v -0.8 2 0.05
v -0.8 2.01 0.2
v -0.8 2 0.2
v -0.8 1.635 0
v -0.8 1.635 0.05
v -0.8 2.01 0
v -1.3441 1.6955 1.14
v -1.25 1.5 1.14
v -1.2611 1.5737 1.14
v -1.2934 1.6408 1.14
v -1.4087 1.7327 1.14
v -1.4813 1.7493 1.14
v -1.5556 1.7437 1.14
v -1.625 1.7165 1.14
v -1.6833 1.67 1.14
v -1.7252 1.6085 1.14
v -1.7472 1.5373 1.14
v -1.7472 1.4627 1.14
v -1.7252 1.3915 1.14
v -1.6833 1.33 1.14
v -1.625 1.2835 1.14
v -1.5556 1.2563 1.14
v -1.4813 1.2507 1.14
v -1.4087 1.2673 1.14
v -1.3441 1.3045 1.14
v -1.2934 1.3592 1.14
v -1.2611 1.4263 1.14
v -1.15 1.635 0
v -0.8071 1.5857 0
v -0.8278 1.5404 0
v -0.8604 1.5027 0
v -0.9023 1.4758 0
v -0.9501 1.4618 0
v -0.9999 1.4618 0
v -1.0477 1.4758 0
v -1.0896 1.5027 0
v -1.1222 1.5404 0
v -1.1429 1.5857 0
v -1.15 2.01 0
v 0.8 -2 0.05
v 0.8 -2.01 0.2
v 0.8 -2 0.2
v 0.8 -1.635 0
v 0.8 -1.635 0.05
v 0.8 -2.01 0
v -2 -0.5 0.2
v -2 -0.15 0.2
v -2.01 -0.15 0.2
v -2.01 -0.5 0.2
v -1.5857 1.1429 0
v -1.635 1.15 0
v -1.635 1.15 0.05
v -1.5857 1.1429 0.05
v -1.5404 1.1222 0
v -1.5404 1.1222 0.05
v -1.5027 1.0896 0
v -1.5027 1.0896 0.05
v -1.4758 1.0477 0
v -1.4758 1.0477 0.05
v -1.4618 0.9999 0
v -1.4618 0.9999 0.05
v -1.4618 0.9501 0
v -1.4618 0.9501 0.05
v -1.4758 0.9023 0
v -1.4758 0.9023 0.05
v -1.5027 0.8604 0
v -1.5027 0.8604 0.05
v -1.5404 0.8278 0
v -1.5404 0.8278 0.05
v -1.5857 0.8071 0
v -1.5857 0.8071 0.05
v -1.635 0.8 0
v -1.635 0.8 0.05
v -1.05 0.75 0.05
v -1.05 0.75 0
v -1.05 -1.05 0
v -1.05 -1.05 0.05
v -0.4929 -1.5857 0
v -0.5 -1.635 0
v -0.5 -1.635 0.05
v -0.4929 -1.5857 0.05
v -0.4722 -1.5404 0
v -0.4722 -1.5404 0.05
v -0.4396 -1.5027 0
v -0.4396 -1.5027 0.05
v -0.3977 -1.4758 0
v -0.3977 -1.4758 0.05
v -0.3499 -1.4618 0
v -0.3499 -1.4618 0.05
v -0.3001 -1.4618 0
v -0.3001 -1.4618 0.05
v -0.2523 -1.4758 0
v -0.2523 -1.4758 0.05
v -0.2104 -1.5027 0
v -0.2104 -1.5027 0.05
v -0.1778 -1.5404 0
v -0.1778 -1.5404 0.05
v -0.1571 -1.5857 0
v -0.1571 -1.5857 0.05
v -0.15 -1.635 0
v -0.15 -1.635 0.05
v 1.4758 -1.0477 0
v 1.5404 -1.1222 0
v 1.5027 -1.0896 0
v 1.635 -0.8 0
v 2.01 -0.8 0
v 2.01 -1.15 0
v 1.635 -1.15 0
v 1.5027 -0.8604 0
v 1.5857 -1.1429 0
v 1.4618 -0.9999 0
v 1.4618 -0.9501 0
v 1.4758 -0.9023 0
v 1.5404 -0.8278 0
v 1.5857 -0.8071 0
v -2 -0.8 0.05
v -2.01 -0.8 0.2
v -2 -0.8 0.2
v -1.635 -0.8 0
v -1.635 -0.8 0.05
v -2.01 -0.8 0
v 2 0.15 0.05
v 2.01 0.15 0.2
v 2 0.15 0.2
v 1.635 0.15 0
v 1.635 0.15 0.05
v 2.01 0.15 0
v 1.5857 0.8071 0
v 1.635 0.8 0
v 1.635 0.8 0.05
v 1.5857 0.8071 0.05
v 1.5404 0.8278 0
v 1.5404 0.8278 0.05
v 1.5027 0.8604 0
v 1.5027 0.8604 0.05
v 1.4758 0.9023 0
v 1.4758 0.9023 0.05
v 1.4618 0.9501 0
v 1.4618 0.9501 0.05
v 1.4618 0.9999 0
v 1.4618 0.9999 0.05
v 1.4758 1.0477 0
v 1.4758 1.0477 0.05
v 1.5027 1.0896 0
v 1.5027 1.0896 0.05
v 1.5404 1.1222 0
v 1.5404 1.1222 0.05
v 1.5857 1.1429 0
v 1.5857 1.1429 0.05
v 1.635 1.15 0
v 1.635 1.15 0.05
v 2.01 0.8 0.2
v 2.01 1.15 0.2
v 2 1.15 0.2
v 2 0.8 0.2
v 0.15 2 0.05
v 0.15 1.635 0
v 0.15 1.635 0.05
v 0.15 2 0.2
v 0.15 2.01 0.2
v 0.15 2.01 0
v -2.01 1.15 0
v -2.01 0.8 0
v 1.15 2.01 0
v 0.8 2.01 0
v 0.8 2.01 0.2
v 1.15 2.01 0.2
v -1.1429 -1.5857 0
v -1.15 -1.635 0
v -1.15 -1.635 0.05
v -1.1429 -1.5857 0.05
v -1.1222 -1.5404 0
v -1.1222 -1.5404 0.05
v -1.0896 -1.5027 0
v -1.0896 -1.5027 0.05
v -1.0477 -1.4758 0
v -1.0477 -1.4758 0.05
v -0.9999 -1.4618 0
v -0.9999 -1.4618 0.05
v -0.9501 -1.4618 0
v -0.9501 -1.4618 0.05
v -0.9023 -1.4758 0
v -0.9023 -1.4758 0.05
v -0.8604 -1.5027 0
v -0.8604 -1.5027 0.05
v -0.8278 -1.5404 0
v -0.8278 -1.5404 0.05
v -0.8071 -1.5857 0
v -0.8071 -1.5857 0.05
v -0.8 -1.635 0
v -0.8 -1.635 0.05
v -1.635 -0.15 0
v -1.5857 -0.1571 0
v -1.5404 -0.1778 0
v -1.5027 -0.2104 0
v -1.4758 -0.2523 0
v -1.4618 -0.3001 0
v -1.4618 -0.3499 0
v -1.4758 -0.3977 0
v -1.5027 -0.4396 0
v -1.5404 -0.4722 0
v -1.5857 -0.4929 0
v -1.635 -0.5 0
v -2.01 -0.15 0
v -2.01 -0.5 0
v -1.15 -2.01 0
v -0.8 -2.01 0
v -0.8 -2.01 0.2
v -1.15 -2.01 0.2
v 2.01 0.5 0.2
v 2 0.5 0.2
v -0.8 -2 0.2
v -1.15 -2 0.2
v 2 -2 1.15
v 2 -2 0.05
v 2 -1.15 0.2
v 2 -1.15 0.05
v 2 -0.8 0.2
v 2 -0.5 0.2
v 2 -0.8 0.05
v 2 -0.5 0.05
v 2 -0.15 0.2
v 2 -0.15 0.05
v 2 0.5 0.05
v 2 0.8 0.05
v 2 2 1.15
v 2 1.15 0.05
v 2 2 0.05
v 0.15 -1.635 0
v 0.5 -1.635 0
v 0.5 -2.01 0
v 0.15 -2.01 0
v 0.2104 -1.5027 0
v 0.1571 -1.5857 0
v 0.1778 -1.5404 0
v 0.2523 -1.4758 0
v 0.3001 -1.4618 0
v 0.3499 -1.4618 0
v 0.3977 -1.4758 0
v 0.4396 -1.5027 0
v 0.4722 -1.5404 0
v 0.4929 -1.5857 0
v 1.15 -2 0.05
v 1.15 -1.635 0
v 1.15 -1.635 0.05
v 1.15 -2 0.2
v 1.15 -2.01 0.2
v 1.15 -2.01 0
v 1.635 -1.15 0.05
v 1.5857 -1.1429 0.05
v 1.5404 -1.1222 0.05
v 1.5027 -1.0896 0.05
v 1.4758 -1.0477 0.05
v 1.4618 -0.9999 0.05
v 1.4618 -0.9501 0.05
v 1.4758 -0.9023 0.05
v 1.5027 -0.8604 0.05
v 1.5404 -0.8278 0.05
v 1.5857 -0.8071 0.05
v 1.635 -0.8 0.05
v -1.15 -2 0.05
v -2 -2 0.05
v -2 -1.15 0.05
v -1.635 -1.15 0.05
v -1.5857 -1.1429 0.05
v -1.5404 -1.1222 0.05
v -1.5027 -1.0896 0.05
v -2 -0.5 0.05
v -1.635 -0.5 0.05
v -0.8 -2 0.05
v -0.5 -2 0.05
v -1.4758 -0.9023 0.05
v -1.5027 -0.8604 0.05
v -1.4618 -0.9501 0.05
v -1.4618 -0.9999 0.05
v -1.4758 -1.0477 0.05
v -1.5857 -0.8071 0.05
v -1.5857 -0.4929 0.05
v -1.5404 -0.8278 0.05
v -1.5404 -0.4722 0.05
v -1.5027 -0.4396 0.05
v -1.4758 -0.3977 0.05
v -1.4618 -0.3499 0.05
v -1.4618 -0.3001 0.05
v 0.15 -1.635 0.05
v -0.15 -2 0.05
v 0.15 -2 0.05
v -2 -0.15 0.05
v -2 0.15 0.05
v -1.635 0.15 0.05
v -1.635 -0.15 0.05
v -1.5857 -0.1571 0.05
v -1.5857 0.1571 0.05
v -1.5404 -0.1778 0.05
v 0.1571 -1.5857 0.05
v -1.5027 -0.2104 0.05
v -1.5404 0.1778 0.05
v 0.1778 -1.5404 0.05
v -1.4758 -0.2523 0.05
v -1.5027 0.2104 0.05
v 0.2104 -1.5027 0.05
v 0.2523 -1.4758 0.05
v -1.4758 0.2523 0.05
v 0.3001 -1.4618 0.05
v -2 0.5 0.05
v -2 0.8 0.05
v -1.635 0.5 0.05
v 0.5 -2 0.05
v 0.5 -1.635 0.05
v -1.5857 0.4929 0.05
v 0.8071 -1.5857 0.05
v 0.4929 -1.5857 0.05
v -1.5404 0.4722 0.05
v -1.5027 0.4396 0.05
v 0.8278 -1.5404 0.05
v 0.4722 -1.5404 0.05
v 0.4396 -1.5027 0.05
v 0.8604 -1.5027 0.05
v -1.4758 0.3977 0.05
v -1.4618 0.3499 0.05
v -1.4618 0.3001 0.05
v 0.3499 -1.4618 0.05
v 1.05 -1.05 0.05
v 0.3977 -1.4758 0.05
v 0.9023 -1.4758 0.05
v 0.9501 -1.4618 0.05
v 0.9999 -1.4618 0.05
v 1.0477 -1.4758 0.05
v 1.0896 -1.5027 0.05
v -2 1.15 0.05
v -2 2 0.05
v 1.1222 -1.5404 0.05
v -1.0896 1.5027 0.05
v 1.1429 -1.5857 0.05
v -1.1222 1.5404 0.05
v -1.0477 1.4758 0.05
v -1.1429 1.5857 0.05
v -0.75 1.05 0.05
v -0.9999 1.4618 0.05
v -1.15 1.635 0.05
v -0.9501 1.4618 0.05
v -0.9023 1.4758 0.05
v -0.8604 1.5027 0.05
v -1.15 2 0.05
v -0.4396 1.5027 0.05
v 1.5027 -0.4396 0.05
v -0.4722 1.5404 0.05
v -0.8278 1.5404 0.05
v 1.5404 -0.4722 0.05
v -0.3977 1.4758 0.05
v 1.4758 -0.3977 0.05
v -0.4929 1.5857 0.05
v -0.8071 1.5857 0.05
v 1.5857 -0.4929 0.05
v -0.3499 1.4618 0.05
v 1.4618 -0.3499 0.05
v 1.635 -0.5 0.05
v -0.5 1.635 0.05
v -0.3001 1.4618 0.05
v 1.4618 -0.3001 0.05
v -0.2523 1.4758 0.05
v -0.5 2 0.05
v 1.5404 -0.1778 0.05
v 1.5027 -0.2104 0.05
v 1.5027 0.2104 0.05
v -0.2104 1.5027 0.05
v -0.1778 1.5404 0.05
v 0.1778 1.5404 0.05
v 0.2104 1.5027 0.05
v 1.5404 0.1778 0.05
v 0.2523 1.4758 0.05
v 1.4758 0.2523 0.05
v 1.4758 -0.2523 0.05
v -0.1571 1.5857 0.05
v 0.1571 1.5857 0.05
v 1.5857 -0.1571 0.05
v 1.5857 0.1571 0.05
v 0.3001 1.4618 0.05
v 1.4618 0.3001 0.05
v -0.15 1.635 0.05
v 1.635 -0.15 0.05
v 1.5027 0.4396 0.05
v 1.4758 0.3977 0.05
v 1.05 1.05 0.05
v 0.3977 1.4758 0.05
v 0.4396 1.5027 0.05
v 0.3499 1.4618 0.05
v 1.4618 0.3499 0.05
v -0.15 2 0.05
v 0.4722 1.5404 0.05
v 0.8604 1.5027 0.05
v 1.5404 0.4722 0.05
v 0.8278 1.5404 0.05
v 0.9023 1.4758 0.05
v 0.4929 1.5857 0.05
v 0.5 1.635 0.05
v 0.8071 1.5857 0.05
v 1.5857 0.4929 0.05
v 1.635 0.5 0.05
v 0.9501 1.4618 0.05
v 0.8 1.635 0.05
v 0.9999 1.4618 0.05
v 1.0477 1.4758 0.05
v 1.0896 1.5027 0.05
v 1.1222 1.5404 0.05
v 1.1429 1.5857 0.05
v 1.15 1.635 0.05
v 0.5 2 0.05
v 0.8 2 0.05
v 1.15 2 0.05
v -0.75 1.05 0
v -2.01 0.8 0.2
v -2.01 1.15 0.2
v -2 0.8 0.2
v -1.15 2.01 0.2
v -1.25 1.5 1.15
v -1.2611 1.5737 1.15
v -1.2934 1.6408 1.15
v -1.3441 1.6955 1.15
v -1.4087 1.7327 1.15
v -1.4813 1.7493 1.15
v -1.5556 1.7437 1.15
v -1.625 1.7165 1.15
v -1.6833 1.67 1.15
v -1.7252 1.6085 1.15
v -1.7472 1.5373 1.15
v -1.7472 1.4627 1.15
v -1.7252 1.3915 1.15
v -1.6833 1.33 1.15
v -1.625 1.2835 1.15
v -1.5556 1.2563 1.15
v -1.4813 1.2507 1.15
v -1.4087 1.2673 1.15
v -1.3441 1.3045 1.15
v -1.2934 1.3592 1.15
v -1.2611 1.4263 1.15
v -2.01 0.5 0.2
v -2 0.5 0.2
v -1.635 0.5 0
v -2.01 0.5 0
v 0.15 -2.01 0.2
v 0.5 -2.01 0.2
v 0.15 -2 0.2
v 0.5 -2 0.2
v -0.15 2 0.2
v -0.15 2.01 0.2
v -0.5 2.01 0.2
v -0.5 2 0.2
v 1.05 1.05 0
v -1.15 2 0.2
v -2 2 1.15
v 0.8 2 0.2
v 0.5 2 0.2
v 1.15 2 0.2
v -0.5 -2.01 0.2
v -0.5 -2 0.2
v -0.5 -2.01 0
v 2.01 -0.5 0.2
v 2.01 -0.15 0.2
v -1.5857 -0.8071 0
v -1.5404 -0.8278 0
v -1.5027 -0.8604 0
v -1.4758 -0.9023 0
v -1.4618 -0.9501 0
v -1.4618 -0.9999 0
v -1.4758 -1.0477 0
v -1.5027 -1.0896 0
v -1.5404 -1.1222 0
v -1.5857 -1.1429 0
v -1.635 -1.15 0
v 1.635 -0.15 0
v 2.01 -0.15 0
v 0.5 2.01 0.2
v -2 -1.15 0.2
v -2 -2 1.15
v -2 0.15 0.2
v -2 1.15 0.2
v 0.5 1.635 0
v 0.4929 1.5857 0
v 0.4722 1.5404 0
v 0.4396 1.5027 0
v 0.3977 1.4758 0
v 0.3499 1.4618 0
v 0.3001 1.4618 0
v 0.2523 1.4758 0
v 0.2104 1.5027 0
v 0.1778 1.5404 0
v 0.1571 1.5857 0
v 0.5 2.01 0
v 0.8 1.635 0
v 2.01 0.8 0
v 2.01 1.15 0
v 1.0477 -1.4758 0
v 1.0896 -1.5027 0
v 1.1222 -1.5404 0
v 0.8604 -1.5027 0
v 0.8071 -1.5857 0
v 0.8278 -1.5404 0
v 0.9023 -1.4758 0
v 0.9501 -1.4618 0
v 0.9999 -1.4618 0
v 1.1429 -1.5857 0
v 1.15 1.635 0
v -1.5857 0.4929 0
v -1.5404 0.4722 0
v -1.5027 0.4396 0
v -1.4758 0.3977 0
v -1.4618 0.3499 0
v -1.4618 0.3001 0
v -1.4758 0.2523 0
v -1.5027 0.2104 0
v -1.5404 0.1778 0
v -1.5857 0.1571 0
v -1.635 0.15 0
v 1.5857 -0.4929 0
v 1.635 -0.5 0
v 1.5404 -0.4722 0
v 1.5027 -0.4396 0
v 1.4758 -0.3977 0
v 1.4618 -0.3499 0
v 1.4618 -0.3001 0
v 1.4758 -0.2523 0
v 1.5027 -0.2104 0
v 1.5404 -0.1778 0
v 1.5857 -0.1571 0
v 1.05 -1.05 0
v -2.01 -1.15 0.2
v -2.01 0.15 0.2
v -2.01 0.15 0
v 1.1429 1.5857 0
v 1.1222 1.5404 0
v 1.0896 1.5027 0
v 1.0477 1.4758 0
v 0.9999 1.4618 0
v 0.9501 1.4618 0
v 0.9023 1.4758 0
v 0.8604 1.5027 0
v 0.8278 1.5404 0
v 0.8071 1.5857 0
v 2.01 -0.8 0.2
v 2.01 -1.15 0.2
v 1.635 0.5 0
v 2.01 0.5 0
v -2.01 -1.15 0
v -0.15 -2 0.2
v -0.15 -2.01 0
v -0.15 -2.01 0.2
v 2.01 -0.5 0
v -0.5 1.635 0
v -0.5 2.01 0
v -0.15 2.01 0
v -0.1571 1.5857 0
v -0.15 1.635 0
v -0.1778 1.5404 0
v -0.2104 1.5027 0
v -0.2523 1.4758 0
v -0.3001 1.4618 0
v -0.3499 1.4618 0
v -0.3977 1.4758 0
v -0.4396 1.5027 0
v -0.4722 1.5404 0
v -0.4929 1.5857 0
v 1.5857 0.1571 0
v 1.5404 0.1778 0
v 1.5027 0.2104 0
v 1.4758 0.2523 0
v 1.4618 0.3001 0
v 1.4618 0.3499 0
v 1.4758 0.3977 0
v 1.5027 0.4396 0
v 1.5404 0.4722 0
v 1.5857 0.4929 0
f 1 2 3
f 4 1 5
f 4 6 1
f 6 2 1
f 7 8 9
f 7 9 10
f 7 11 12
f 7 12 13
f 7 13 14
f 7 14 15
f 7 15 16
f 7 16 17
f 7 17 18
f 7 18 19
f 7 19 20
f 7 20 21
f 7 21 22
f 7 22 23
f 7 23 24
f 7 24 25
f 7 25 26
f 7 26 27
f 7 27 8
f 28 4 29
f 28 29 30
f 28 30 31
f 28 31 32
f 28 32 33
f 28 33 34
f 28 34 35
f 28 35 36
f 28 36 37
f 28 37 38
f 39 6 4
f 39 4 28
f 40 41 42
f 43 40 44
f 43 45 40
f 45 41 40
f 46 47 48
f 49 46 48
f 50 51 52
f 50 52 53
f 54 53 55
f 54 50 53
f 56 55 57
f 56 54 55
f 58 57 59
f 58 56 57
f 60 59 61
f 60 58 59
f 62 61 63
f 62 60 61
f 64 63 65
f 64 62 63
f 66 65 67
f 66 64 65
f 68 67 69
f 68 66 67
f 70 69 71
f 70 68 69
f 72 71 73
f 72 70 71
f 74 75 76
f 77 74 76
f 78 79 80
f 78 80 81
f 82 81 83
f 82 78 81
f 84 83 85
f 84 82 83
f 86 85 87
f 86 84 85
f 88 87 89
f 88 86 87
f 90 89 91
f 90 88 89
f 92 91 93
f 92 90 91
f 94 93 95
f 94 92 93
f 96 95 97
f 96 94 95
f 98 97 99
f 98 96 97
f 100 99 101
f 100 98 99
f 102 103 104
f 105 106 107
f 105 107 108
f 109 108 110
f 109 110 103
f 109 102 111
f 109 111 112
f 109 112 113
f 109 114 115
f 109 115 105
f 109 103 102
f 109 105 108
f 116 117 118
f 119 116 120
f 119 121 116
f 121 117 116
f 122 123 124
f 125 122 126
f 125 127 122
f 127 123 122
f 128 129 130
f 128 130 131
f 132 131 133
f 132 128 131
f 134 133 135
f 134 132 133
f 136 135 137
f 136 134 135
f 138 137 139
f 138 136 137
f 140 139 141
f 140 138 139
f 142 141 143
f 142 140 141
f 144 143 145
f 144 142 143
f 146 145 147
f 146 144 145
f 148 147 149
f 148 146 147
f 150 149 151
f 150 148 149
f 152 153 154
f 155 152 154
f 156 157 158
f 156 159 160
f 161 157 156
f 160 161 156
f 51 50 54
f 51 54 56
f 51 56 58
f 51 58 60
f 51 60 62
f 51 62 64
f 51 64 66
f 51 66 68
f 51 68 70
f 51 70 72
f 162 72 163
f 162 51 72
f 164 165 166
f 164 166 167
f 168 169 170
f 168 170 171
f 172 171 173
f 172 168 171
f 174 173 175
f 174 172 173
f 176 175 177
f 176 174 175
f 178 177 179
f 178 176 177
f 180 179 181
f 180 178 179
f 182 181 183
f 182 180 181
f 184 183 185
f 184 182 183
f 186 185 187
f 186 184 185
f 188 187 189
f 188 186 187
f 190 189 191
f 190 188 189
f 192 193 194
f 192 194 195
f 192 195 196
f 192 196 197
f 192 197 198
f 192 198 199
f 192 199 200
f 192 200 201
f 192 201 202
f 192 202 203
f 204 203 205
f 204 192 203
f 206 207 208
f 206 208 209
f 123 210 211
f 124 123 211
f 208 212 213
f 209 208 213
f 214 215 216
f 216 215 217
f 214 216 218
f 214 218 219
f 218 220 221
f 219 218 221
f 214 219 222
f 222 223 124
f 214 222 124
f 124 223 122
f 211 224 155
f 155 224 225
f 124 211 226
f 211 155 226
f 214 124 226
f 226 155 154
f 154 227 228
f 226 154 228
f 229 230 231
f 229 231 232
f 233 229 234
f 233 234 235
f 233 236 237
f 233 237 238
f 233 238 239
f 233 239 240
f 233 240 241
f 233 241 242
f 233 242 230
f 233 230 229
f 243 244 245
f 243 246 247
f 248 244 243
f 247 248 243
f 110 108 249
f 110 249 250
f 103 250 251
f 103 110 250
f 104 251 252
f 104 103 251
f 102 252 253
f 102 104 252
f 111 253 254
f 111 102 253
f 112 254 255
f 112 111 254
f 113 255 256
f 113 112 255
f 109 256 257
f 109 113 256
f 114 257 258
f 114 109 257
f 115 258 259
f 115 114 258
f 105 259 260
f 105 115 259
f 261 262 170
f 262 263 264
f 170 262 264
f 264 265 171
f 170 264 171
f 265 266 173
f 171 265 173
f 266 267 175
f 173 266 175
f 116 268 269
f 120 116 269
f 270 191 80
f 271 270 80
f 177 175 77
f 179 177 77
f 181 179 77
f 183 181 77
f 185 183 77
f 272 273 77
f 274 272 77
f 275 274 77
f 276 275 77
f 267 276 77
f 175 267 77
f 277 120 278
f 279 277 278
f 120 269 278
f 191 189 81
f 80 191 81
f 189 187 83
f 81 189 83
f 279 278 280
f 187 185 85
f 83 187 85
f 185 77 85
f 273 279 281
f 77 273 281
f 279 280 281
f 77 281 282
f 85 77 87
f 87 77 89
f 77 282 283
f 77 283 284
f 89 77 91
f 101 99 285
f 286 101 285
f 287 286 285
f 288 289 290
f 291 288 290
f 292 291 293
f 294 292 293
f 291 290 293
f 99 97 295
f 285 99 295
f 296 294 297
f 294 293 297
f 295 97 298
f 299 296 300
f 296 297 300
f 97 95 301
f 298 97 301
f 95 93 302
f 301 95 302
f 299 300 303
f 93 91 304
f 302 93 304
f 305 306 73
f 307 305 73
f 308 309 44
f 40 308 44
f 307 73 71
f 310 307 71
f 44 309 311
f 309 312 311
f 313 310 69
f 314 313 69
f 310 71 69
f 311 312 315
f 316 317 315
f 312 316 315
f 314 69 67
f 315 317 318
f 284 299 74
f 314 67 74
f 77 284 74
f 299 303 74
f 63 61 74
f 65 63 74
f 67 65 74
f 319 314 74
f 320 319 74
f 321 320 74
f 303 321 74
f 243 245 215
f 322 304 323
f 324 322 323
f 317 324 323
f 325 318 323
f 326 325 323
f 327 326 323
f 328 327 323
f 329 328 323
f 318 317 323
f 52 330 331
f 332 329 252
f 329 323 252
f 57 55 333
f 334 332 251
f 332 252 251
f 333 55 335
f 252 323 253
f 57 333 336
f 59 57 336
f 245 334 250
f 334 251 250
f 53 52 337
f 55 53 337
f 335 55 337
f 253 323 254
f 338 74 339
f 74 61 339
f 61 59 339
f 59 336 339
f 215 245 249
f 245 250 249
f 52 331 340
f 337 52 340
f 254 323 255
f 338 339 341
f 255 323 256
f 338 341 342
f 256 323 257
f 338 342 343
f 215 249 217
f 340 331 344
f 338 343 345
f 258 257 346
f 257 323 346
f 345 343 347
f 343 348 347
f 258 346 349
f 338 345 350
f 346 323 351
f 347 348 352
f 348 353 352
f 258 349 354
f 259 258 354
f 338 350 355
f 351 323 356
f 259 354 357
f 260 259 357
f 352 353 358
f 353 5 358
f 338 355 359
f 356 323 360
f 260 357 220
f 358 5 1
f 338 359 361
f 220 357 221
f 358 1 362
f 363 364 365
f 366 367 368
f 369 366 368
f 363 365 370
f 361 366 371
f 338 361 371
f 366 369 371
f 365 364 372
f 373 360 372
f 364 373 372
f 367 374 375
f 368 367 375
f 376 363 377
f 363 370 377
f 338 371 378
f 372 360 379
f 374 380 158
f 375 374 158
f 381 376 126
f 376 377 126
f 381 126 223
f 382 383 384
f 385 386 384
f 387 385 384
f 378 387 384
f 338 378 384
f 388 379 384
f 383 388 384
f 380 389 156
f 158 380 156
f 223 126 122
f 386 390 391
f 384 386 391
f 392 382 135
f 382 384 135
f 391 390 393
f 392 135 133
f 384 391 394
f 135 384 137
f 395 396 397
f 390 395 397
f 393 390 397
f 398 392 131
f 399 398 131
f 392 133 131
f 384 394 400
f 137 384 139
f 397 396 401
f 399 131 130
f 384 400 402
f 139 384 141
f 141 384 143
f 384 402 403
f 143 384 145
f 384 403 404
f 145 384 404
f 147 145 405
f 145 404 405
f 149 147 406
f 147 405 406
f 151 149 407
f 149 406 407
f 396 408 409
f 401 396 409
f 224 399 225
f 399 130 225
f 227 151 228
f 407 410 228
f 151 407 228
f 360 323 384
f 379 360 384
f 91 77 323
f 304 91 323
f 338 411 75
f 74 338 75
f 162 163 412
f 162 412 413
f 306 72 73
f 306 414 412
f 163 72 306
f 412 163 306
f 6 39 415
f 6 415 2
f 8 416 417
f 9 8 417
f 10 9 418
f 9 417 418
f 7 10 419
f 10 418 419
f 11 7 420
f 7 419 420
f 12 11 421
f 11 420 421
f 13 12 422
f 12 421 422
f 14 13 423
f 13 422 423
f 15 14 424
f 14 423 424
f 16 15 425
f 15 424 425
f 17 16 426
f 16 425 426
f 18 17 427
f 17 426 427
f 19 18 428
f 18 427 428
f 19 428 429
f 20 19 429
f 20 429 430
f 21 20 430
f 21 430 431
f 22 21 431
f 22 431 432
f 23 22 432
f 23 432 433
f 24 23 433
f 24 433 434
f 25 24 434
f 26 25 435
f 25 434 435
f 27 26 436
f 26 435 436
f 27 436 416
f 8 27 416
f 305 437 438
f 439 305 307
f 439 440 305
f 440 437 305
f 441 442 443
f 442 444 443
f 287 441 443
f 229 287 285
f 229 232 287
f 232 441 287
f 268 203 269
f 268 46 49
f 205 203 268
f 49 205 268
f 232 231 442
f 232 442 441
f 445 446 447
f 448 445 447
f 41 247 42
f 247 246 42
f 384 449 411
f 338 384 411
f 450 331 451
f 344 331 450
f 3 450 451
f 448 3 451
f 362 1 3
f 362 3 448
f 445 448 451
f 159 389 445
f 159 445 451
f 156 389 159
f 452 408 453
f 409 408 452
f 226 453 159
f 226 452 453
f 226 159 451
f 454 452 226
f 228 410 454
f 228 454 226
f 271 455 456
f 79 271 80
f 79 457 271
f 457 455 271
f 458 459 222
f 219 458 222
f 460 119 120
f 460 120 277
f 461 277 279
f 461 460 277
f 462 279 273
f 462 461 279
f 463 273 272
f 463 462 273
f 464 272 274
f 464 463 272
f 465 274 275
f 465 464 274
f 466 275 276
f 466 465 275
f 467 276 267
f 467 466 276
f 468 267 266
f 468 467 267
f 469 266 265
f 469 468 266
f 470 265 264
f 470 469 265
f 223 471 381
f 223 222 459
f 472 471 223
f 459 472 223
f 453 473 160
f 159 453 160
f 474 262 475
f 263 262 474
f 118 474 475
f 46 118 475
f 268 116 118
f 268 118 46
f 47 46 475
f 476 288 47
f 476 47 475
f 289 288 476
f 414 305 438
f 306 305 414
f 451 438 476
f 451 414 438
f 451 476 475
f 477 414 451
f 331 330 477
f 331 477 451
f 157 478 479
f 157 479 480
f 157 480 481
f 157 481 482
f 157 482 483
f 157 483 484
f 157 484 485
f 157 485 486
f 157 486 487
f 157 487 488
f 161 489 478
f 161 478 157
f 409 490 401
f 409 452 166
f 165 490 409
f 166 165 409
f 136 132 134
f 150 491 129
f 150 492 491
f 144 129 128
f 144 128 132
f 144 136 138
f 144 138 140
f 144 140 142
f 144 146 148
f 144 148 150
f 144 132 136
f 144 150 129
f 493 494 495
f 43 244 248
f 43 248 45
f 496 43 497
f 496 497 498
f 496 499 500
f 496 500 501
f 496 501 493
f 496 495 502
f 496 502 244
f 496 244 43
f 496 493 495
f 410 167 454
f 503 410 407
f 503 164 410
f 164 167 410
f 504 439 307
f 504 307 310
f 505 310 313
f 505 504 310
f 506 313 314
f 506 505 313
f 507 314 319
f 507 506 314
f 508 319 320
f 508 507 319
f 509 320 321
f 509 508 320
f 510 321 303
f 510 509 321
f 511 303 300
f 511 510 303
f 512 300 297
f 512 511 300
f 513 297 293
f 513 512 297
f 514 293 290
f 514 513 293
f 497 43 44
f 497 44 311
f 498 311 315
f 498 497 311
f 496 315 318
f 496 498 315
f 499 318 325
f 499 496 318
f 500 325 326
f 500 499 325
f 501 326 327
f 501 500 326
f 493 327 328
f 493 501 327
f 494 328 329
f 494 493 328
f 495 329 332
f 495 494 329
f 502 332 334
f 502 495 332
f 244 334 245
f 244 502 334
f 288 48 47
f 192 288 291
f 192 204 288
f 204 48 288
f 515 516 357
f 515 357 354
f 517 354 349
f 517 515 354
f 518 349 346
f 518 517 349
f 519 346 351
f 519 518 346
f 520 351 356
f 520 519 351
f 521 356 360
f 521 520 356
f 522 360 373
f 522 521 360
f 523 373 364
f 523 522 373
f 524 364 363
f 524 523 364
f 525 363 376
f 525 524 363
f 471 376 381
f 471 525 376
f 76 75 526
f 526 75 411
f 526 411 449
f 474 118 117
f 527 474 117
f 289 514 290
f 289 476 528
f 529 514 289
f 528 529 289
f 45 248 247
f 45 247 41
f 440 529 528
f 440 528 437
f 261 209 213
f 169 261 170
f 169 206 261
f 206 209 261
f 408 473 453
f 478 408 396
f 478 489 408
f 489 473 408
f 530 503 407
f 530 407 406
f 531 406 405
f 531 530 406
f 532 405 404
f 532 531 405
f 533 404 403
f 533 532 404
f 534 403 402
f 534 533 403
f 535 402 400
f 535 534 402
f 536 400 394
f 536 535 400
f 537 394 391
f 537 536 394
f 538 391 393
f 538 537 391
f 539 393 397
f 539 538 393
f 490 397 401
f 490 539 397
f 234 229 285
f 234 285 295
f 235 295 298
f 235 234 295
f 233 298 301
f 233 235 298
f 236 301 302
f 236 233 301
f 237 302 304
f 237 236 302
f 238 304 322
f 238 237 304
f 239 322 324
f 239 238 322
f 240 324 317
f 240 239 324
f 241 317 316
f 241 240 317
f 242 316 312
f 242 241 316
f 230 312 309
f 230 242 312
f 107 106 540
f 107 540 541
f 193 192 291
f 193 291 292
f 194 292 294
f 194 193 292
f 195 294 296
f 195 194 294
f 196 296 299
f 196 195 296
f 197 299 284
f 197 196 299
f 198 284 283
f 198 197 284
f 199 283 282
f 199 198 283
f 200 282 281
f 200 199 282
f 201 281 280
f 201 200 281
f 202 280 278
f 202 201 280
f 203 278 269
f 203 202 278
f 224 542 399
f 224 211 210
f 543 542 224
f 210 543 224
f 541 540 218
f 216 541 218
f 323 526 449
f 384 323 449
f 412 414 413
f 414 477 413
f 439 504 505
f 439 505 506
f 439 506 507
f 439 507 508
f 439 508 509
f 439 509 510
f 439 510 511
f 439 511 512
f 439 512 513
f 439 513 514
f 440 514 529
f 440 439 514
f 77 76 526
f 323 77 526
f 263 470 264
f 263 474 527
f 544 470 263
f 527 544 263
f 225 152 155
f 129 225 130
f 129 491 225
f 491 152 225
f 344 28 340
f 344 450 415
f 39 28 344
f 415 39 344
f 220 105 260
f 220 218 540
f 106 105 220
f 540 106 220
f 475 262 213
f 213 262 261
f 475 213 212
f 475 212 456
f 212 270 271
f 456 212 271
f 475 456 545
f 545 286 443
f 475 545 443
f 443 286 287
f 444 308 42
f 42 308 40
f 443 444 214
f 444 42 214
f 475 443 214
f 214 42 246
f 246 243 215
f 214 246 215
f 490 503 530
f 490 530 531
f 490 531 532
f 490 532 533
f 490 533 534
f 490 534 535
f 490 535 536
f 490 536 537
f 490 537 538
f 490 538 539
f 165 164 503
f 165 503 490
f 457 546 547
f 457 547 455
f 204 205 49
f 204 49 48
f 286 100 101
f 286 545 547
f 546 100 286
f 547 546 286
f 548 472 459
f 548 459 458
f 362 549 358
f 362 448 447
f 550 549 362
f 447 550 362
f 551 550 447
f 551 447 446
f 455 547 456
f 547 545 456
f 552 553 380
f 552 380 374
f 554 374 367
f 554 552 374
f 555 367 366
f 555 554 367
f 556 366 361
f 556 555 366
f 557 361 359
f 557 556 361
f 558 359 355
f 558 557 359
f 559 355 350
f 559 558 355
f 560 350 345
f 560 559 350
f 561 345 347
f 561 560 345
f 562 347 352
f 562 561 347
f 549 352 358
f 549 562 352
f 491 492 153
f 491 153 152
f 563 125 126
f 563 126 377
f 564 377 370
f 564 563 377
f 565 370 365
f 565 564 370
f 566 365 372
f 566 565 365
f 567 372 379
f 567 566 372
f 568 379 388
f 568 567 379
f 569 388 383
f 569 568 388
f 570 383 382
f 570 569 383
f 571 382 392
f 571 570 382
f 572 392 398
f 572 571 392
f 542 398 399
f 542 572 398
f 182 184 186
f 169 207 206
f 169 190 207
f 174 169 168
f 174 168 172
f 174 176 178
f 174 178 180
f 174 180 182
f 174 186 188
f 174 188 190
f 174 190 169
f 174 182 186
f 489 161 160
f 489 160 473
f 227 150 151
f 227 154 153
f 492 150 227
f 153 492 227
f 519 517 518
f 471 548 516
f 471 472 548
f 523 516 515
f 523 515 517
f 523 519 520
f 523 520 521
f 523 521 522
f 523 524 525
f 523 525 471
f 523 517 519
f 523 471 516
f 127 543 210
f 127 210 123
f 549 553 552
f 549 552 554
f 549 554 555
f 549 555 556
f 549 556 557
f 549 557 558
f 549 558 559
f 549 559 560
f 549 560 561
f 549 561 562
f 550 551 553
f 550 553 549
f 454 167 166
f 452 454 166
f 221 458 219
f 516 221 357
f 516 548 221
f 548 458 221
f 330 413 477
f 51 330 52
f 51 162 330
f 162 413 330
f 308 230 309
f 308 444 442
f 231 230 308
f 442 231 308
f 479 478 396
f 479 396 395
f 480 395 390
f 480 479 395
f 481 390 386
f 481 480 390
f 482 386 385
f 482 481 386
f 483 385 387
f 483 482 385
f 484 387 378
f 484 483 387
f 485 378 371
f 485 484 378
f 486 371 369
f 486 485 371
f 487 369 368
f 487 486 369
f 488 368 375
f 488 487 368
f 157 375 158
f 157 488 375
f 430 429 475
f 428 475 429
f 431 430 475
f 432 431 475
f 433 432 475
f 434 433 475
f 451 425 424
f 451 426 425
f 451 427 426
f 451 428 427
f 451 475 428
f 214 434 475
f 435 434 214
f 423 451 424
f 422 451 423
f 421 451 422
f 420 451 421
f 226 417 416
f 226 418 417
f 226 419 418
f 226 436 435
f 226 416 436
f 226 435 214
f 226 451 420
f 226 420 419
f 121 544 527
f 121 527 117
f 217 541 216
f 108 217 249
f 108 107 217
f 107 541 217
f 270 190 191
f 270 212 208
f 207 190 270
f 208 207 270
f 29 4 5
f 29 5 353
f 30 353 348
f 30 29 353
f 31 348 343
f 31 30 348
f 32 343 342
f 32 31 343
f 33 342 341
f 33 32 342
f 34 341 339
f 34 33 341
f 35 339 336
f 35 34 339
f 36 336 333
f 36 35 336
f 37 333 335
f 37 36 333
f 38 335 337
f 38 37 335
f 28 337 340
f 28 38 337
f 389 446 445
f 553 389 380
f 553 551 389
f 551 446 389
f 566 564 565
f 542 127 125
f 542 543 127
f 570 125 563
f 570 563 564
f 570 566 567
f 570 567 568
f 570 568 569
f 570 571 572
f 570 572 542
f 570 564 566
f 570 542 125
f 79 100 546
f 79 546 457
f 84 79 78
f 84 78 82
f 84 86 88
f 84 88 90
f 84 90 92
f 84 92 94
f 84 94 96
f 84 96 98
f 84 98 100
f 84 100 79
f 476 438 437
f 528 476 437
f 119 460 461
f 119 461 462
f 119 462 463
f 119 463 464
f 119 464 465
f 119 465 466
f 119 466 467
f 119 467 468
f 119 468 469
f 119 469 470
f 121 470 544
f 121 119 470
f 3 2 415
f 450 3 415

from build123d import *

# Parameters (mm, degrees)
ESBO_O1_W                = 4
ESBO_O1_H                = 4
RESSALTO_EXTRUS_O1_DEPTH = 1.1
RESSALTO_EXTRUS_O2_DEPTH = 0.2
ESBO_O3_R                = 0.25
CORTE_EXTRUS_O1_DEPTH    = 0.01


with BuildPart() as part:
    # Esboço1 → Ressalto-extrusão1 (new body)
    with BuildSketch(Plane.XY.offset(0.05)):
        Rectangle(ESBO_O1_W, ESBO_O1_H)
    extrude(amount=RESSALTO_EXTRUS_O1_DEPTH)

    # Esboço2 → Ressalto-extrusão2 (add)
    with BuildSketch(Plane.XY):
        Polygon((-1.05, -1.05), (1.05, -1.05), (1.05, 1.05), (-0.75, 1.05), (-1.05, 0.75), align=None)
        with BuildLine():
            Line((-0.8, -2.01), (-1.15, -2.01))
            Line((-1.15, -2.01), (-1.15, -1.635))
            ThreePointArc((-1.15, -1.635), (-0.975, -1.46), (-0.8, -1.635))
            Line((-0.8, -1.635), (-0.8, -2.01))
        make_face()
        with BuildLine():
            Line((-0.5, -2.01), (-0.5, -1.635))
            ThreePointArc((-0.5, -1.635), (-0.325, -1.46), (-0.15, -1.635))
            Line((-0.15, -1.635), (-0.15, -2.01))
            Line((-0.15, -2.01), (-0.5, -2.01))
        make_face()
        with BuildLine():
            Line((0.15, -2.01), (0.15, -1.635))
            ThreePointArc((0.15, -1.635), (0.325, -1.46), (0.5, -1.635))
            Line((0.5, -1.635), (0.5, -2.01))
            Line((0.5, -2.01), (0.15, -2.01))
        make_face()
        with BuildLine():
            Line((0.8, -2.01), (0.8, -1.635))
            ThreePointArc((0.8, -1.635), (0.975, -1.46), (1.15, -1.635))
            Line((1.15, -1.635), (1.15, -2.01))
            Line((1.15, -2.01), (0.8, -2.01))
        make_face()
        with BuildLine():
            Line((-2.01, 0.8), (-2.01, 1.15))
            Line((-2.01, 1.15), (-1.635, 1.15))
            ThreePointArc((-1.635, 1.15), (-1.46, 0.975), (-1.635, 0.8))
            Line((-1.635, 0.8), (-2.01, 0.8))
        make_face()
        with BuildLine():
            Line((-2.01, 0.5), (-1.635, 0.5))
            ThreePointArc((-1.635, 0.5), (-1.46, 0.325), (-1.635, 0.15))
            Line((-1.635, 0.15), (-2.01, 0.15))
            Line((-2.01, 0.15), (-2.01, 0.5))
        make_face()
        with BuildLine():
            Line((-2.01, -0.15), (-1.635, -0.15))
            ThreePointArc((-1.635, -0.15), (-1.46, -0.325), (-1.635, -0.5))
            Line((-1.635, -0.5), (-2.01, -0.5))
            Line((-2.01, -0.5), (-2.01, -0.15))
        make_face()
        with BuildLine():
            Line((-2.01, -0.8), (-1.635, -0.8))
            ThreePointArc((-1.635, -0.8), (-1.46, -0.975), (-1.635, -1.15))
            Line((-1.635, -1.15), (-2.01, -1.15))
            Line((-2.01, -1.15), (-2.01, -0.8))
        make_face()
        with BuildLine():
            Line((0.8, 2.01), (1.15, 2.01))
            Line((1.15, 2.01), (1.15, 1.635))
            ThreePointArc((1.15, 1.635), (0.975, 1.46), (0.8, 1.635))
            Line((0.8, 1.635), (0.8, 2.01))
        make_face()
        with BuildLine():
            Line((0.5, 2.01), (0.5, 1.635))
            ThreePointArc((0.5, 1.635), (0.325, 1.46), (0.15, 1.635))
            Line((0.15, 1.635), (0.15, 2.01))
            Line((0.15, 2.01), (0.5, 2.01))
        make_face()
        with BuildLine():
            Line((-0.15, 2.01), (-0.15, 1.635))
            ThreePointArc((-0.15, 1.635), (-0.325, 1.46), (-0.5, 1.635))
            Line((-0.5, 1.635), (-0.5, 2.01))
            Line((-0.5, 2.01), (-0.15, 2.01))
        make_face()
        with BuildLine():
            Line((-0.8, 2.01), (-0.8, 1.635))
            ThreePointArc((-0.8, 1.635), (-0.975, 1.46), (-1.15, 1.635))
            Line((-1.15, 1.635), (-1.15, 2.01))
            Line((-1.15, 2.01), (-0.8, 2.01))
        make_face()
        with BuildLine():
            Line((2.01, -0.8), (2.01, -1.15))
            Line((2.01, -1.15), (1.635, -1.15))
            ThreePointArc((1.635, -1.15), (1.46, -0.975), (1.635, -0.8))
            Line((1.635, -0.8), (2.01, -0.8))
        make_face()
        with BuildLine():
            Line((2.01, -0.5), (1.635, -0.5))
            ThreePointArc((1.635, -0.5), (1.46, -0.325), (1.635, -0.15))
            Line((1.635, -0.15), (2.01, -0.15))
            Line((2.01, -0.15), (2.01, -0.5))
        make_face()
        with BuildLine():
            Line((2.01, 0.15), (1.635, 0.15))
            ThreePointArc((1.635, 0.15), (1.46, 0.325), (1.635, 0.5))
            Line((1.635, 0.5), (2.01, 0.5))
            Line((2.01, 0.5), (2.01, 0.15))
        make_face()
        with BuildLine():
            Line((2.01, 0.8), (1.635, 0.8))
            ThreePointArc((1.635, 0.8), (1.46, 0.975), (1.635, 1.15))
            Line((1.635, 1.15), (2.01, 1.15))
            Line((2.01, 1.15), (2.01, 0.8))
        make_face()
    extrude(amount=RESSALTO_EXTRUS_O2_DEPTH)

    # Esboço3 → Corte-extrusão1 (cut)
    with BuildSketch(Plane.XY.offset(1.15)):
        with Locations((-1.5, 1.5)):
            Circle(ESBO_O3_R)
    extrude(amount=-CORTE_EXTRUS_O1_DEPTH, mode=Mode.SUBTRACT)


solid = part.part
